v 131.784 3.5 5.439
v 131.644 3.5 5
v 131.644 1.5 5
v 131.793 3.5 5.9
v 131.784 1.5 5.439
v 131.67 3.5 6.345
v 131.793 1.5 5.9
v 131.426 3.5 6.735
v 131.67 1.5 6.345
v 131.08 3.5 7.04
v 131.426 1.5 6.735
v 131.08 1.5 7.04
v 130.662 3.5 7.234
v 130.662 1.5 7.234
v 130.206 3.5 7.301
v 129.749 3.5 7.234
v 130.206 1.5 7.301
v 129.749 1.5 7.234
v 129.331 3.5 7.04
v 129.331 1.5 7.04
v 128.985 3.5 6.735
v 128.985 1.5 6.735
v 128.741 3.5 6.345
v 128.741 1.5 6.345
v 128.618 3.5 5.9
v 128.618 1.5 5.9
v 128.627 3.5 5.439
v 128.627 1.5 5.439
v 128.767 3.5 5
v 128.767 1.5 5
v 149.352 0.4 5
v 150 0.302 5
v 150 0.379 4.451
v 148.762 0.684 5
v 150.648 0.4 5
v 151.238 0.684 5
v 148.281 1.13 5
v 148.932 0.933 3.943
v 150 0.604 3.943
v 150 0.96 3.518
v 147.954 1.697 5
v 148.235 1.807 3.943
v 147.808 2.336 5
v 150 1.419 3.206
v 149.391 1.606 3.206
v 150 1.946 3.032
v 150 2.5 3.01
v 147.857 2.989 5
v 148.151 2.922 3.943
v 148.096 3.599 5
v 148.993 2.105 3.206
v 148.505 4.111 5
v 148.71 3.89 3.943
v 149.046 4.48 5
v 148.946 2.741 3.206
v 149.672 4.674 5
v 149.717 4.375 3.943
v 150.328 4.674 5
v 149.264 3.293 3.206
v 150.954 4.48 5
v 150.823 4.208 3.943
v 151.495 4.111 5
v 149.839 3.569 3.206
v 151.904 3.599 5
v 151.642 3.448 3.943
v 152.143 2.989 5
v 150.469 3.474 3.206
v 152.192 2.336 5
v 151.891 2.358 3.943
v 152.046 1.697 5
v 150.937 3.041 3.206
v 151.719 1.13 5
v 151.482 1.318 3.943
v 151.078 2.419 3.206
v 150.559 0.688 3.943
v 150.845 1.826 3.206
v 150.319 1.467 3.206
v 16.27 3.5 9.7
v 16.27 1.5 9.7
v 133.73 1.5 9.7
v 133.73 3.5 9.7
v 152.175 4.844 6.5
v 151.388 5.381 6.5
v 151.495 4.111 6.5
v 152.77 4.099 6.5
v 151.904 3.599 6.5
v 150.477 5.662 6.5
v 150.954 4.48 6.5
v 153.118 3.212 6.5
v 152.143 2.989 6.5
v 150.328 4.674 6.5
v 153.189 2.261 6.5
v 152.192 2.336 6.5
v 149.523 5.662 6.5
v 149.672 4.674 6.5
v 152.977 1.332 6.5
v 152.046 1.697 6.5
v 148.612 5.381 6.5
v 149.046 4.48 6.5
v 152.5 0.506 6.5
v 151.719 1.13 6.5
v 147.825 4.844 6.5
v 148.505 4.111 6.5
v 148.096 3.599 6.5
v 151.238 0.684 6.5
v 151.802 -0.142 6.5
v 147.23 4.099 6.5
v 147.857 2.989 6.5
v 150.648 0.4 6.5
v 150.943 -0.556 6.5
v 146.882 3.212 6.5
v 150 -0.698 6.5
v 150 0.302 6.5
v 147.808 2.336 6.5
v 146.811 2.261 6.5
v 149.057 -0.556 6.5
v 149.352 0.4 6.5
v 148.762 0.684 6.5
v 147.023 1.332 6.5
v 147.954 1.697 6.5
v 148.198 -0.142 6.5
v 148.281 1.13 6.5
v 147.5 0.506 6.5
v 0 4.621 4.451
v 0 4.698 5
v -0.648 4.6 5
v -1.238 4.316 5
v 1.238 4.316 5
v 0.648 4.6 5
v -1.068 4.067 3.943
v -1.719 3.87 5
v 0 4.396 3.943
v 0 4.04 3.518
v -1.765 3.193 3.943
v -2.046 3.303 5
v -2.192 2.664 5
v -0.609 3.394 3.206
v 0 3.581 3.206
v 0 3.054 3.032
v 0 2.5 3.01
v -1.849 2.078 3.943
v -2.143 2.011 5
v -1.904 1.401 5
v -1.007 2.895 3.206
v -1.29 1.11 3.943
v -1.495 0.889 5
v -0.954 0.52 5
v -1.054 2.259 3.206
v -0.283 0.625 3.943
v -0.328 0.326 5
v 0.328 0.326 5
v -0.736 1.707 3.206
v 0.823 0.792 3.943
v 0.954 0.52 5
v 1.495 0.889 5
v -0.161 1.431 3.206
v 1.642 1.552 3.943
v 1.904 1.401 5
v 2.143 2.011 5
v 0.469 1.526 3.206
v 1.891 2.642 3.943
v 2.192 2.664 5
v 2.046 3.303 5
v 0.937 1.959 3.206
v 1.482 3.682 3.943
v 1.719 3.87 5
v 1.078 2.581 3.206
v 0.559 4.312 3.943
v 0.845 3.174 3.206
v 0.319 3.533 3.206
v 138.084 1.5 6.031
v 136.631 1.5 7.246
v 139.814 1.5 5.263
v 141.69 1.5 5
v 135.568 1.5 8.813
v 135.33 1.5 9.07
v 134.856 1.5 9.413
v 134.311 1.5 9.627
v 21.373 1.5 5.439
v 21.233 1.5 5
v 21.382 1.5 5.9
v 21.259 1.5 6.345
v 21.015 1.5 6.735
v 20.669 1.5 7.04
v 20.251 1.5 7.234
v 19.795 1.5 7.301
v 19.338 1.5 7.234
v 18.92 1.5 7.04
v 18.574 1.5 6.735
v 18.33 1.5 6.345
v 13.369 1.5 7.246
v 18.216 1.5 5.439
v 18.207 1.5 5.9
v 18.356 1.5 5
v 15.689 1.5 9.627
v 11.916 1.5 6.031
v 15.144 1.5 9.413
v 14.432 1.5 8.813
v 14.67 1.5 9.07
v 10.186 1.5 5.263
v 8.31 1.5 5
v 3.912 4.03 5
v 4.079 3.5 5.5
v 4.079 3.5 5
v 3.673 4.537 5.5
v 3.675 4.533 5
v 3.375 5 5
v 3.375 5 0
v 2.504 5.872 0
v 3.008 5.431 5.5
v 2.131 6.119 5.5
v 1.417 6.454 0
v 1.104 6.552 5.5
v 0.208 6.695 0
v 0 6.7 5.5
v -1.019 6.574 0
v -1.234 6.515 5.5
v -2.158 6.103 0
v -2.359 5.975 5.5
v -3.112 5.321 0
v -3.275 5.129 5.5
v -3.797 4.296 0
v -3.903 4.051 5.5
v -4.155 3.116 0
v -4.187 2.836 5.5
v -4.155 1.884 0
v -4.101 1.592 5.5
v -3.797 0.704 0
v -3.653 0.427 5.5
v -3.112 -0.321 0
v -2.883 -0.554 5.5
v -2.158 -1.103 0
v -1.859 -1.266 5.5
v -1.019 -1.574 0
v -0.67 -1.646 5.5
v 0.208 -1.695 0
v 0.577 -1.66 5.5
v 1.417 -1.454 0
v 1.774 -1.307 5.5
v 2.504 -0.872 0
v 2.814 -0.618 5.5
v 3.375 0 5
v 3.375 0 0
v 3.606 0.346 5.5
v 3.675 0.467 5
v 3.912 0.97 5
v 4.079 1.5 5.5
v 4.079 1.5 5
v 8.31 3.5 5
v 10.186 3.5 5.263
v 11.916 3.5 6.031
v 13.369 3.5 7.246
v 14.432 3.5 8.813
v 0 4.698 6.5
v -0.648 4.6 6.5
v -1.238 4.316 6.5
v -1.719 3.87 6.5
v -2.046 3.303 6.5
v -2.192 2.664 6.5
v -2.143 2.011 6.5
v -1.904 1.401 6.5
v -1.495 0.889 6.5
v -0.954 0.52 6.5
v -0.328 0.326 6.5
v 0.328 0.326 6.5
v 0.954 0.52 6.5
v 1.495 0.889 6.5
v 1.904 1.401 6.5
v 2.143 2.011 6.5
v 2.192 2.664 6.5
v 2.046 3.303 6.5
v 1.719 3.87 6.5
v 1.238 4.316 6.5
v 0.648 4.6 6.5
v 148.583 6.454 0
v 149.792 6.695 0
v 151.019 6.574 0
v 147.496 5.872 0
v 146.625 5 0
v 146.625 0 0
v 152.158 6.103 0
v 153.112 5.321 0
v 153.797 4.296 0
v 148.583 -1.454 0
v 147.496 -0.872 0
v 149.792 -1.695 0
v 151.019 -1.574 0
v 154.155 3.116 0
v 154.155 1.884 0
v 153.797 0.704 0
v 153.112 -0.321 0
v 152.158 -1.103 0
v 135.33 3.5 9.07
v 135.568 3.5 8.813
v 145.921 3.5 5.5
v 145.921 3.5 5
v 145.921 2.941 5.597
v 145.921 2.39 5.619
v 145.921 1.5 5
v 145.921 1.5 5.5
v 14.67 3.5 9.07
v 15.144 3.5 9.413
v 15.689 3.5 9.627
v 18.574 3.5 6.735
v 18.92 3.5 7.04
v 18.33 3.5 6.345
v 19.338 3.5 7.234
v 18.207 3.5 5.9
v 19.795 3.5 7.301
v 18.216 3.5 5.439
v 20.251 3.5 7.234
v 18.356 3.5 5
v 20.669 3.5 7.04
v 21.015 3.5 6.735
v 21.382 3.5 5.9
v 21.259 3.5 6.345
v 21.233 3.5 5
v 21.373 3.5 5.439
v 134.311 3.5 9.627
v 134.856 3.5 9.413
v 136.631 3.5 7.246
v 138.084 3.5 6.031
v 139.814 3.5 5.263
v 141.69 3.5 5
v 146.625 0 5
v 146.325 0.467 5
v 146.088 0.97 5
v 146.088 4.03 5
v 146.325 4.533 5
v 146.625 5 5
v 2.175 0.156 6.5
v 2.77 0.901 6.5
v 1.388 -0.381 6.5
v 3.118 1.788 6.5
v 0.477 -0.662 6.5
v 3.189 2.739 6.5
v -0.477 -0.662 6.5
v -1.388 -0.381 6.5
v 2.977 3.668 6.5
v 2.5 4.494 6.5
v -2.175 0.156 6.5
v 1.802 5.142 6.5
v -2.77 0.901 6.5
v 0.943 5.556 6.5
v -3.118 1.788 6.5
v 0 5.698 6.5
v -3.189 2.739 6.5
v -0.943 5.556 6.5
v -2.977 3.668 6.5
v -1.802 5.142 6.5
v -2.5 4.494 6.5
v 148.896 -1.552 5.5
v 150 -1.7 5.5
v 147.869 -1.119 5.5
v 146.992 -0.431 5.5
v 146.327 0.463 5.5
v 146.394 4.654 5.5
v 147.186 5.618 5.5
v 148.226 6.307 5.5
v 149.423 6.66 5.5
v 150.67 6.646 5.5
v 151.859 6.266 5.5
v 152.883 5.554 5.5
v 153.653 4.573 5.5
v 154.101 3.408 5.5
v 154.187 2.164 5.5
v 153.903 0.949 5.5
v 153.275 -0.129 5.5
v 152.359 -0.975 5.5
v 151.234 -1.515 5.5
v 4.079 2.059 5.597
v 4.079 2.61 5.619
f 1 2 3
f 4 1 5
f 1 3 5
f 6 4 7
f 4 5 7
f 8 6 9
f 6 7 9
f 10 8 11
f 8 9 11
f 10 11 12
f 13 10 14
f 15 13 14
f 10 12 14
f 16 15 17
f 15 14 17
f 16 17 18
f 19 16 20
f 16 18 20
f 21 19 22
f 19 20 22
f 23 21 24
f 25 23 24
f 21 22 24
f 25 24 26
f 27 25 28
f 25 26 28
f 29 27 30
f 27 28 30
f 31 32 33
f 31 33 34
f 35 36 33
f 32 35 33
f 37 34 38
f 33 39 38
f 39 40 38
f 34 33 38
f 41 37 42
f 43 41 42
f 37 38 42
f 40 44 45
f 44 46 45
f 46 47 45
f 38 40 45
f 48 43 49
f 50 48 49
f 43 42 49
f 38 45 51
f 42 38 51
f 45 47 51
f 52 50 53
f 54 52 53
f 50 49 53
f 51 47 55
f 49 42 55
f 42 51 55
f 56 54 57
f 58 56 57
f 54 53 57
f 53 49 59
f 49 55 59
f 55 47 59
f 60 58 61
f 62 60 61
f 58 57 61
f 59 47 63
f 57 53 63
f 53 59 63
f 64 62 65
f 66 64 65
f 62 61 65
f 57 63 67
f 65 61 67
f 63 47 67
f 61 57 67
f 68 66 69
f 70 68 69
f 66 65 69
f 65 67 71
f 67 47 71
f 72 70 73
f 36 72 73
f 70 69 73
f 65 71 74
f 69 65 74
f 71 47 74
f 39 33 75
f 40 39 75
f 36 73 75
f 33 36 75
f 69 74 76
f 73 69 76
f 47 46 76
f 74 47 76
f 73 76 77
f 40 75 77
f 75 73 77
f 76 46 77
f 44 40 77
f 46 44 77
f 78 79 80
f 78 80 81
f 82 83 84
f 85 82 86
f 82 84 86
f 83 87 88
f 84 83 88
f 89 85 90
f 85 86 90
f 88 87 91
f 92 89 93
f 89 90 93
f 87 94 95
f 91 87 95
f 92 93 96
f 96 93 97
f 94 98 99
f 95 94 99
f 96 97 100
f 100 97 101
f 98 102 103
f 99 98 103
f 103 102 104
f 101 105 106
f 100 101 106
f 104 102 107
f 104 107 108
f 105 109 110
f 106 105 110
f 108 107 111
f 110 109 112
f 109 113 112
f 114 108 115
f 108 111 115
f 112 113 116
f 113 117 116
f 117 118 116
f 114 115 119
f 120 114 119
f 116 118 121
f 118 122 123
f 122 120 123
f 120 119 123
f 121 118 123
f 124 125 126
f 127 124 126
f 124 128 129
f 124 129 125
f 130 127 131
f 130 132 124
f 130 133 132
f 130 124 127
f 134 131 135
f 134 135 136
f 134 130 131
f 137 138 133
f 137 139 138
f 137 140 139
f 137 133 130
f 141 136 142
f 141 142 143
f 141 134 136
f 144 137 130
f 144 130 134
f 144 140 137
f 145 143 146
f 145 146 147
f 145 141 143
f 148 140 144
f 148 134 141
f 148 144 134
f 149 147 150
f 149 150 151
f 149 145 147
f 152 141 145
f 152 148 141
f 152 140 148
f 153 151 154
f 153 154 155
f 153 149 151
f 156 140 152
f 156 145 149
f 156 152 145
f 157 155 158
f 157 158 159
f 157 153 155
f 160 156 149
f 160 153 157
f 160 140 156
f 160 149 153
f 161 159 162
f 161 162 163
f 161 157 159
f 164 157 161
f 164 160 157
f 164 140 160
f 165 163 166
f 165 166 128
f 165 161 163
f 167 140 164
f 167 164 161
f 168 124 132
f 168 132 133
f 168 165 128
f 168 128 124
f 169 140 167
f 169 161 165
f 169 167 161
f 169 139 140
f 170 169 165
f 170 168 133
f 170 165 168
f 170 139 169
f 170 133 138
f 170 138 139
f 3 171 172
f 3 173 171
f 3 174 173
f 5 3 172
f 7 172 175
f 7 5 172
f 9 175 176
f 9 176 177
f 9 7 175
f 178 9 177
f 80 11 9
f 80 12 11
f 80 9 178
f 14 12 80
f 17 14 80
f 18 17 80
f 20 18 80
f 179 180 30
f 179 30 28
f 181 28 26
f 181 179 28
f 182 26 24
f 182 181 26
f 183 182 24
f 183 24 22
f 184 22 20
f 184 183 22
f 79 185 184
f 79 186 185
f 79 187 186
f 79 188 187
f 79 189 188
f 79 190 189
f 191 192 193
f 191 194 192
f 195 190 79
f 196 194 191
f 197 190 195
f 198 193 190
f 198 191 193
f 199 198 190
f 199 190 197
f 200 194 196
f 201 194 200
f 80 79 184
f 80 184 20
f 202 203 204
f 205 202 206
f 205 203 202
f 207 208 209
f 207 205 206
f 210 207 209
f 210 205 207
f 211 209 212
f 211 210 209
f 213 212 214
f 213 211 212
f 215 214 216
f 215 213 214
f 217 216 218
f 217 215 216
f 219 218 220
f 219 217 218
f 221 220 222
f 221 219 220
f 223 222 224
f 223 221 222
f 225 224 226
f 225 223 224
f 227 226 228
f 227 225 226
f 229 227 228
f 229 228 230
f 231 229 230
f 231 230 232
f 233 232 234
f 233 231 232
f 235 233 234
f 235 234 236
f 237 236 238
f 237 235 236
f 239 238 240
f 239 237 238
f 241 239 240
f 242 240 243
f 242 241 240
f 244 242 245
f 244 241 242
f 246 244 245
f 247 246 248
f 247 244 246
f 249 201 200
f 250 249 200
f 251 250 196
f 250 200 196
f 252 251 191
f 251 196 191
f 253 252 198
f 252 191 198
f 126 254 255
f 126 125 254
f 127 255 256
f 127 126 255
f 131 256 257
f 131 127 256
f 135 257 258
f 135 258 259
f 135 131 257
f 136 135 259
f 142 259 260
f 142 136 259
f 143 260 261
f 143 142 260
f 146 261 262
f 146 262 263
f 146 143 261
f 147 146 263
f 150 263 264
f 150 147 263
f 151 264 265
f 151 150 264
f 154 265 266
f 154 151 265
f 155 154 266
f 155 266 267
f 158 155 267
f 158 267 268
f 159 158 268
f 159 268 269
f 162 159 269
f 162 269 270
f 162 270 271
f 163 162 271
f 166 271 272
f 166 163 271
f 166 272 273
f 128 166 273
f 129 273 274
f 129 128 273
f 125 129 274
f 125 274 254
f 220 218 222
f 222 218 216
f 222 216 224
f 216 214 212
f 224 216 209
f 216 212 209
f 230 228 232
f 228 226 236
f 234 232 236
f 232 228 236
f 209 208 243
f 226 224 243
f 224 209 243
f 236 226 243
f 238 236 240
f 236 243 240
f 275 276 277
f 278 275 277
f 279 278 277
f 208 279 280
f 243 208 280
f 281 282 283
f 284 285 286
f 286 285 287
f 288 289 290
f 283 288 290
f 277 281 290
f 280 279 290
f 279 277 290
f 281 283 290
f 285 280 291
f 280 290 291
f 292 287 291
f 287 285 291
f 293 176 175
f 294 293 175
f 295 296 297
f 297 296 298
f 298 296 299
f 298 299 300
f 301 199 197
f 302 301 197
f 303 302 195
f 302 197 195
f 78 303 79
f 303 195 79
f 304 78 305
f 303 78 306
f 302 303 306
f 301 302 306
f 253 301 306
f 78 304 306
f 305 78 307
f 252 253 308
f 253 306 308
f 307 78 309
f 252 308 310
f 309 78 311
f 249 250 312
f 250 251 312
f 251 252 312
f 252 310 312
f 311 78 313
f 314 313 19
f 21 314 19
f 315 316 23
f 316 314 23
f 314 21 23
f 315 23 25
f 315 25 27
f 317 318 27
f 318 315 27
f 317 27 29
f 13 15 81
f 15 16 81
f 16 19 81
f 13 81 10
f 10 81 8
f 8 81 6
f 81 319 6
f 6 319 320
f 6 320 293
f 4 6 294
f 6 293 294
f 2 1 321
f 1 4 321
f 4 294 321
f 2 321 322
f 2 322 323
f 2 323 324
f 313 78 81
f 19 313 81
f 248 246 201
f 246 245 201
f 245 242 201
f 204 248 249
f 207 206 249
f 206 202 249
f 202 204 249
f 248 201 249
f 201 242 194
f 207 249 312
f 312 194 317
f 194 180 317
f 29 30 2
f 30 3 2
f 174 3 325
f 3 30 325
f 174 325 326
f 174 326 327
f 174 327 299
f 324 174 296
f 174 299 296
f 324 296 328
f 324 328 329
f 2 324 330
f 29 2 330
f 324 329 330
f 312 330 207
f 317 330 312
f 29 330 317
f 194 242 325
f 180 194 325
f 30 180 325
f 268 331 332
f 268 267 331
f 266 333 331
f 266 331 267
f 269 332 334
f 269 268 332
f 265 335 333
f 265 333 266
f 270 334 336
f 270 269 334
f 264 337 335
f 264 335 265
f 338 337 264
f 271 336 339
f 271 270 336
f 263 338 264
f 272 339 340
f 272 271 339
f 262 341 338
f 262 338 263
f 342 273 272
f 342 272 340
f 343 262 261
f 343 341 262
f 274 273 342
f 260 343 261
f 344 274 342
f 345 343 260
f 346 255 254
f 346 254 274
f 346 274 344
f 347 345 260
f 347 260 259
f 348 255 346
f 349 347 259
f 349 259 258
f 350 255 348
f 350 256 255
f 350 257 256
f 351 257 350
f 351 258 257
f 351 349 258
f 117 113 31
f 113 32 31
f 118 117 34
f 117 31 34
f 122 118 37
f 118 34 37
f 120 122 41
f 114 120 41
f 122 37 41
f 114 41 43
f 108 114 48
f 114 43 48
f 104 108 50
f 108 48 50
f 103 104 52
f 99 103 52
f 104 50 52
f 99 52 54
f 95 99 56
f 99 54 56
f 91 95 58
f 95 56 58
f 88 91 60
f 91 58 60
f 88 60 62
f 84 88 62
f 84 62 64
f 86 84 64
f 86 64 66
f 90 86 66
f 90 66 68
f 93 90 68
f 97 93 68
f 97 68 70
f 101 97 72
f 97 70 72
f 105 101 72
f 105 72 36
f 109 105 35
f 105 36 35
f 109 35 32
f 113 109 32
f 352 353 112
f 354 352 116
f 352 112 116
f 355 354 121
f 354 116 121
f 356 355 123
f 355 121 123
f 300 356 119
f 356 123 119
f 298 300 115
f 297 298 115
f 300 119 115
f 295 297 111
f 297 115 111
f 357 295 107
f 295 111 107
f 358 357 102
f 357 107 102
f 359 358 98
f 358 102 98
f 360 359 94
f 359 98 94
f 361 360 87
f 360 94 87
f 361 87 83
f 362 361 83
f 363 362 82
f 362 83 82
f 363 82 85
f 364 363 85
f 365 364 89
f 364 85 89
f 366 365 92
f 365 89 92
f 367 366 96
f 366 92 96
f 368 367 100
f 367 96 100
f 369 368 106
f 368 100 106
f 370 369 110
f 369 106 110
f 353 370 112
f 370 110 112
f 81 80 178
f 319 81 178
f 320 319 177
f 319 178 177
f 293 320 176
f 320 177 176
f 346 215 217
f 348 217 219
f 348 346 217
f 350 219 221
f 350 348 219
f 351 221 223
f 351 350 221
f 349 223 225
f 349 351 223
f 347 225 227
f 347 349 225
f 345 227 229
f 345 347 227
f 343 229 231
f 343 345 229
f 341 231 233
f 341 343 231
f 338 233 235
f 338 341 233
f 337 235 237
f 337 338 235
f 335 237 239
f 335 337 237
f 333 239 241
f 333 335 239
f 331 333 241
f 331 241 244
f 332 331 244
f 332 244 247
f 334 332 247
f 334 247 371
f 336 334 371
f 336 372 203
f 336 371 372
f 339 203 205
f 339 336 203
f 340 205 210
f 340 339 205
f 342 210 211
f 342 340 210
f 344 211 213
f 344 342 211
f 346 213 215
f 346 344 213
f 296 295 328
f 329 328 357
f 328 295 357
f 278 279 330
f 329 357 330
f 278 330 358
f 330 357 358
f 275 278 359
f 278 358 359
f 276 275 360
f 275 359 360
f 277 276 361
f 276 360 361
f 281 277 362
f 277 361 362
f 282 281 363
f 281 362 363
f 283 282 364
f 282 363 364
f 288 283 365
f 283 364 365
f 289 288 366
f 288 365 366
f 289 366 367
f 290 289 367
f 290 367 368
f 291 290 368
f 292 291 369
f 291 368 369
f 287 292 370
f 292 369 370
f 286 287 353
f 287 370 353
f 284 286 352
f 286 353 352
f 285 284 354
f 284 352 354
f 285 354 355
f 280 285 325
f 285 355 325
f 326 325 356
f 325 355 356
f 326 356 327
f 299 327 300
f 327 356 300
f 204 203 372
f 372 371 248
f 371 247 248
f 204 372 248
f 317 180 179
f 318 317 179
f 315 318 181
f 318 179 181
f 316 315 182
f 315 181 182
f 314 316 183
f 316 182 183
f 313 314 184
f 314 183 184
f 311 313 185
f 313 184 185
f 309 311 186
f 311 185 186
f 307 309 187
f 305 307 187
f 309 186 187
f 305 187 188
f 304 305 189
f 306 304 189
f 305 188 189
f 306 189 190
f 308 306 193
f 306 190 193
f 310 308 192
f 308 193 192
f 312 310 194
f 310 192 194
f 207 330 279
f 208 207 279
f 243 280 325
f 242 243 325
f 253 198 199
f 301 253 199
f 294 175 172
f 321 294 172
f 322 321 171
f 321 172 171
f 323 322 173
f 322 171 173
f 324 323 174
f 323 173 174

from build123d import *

# Parameters (mm, degrees)
EXTRUDE_1_REACH                  = 81.748
EXTRUDE_1_END_RADIUS             = 4.2
EXTRUDE_1_DIRECTION_2_REACH      = 81.748
EXTRUDE_1_DIRECTION_2_END_RADIUS = 4.2
CUT_EXTRUDE_2_DEPTH              = 155.592270182
CUT_EXTRUDE_3_DEPTH              = 155.592270182


with BuildPart() as part:
    # 스케치1 → 회전2 (revolve)
    with BuildSketch(Plane(origin=(0, 0, 0), x_dir=(0, 0, -1), z_dir=(1, 0, 0))):
        with BuildLine():
            Line((-6.500191237, 4.698061575), (-5.000191237, 4.698061575))
            ThreePointArc((-5.000191237, 4.698061575), (-3.517605127, 4.040424575), (-3.010022497, 2.5))
            Line((-3.010022497, 2.5), (0, 2.5))
            Line((0, 2.5), (0, 6.7))
            Line((0, 6.7), (-5.5, 6.7))
            Line((-5.5, 6.7), (-6.500191237, 5.698061575))
            Line((-6.500191237, 5.698061575), (-6.500191237, 4.698061575))
        make_face()
    revolve(axis=Axis((0, 2.5, -8.961352657), (0, 0, 1)))



with BuildPart() as body_2:
    # 스케치2 → 회전3 (revolve)
    with BuildSketch(Plane(origin=(150, 0, 0), x_dir=(0, 0, -1), z_dir=(1, 0, 0)), mode=Mode.PRIVATE) as revolve_3_sk:
        with BuildLine():
            Line((0, 2.5), (0, 6.7))
            Line((0, 6.7), (-5.5, 6.7))
            Line((-5.5, 6.7), (-6.500191237, 5.698061575))
            Line((-6.500191237, 5.698061575), (-6.500191237, 4.698061575))
            Line((-6.500191237, 4.698061575), (-5.000191237, 4.698061575))
            ThreePointArc((-5.000191237, 4.698061575), (-3.517605127, 4.040424575), (-3.010022497, 2.5))
            Line((-3.010022497, 2.5), (0, 2.5))
        make_face()
    revolve(revolve_3_sk.sketch.rotate(Axis((150, 2.5, 3.010022497), (0, 0, -1)), 180), axis=Axis((150, 2.5, 3.010022497), (0, 0, -1)))


with BuildPart() as part_1:
    add(part.part)

    add(body_2.part)  # 보스-돌출1 merges body 2
    # 보스-돌출1: up to this cylinder (the profile starts outside it)
    extrude_1_end = Plane(origin=(150, 2.5, 3.825291), z_dir=(0, 0, 1)) * Cylinder(EXTRUDE_1_END_RADIUS, 172.896, mode=Mode.PRIVATE)
    # 스케치3 → 보스-돌출1 (add, up to the surface)
    with BuildSketch(Plane(origin=(75, 0, 0), x_dir=(0, 0, -1), z_dir=(1, 0, 0)), mode=Mode.PRIVATE) as extrude_1_sk1:
        Polygon((-5, 3.5), (-5, 5), (0, 5), (0, 0), (-5, 0), (-5, 1.5), (-9.7, 1.5), (-9.7, 3.5), align=None)
    extrude_1_tool1 = extrude(extrude_1_sk1.sketch, amount=EXTRUDE_1_REACH, mode=Mode.PRIVATE) - extrude_1_end
    add(extrude_1_tool1.solids().sort_by_distance((75, 2.5, 3.825291))[0])

    # 보스-돌출1 direction 2: up to this cylinder (the profile starts outside it)
    extrude_1_direction_2_end = Plane(origin=(0, 2.5, 3.825291), z_dir=(0, 0, -1)) * Cylinder(EXTRUDE_1_DIRECTION_2_END_RADIUS, 172.896, mode=Mode.PRIVATE)
    # 스케치3 → 보스-돌출1 direction 2 (add, up to the surface)
    with BuildSketch(Plane(origin=(75, 0, 0), x_dir=(0, 0, -1), z_dir=(1, 0, 0)), mode=Mode.PRIVATE) as extrude_1_direction_2_sk1:
        Polygon((-5, 3.5), (-5, 5), (0, 5), (0, 0), (-5, 0), (-5, 1.5), (-9.7, 1.5), (-9.7, 3.5), align=None)
    extrude_1_direction_2_tool1 = extrude(extrude_1_direction_2_sk1.sketch, amount=-EXTRUDE_1_DIRECTION_2_REACH, mode=Mode.PRIVATE) - extrude_1_direction_2_end
    add(extrude_1_direction_2_tool1.solids().sort_by_distance((75, 2.5, 3.825291))[0])

    # 스케치4 → 컷-돌출2 (cut, through all)
    with BuildSketch(Plane.XZ.offset(-1.5)):
        with BuildLine():
            Line((145.920784389, 9.7), (133.73, 9.7))
            ThreePointArc((133.73, 9.7), (134.59, 9.536801651), (135.330428215, 9.069897208))
            Line((135.330428215, 9.069897208), (135.567873872, 8.812759968))
            ThreePointArc((135.567873872, 8.812759968), (138.083605002, 6.031129475), (141.689592152, 5))
            Line((141.689592152, 5), (145.920784389, 5))
            Line((145.920784389, 5), (145.920784389, 9.7))
        make_face()
        with BuildLine():
            ThreePointArc((14.669571785, 9.069897208), (15.41, 9.536801651), (16.27, 9.7))
            Line((16.27, 9.7), (4.079215611, 9.7))
            Line((4.079215611, 9.7), (4.079215611, 5))
            Line((4.079215611, 5), (8.310407839, 5))
            ThreePointArc((8.310407839, 5), (11.916394994, 6.031129473), (14.432126128, 8.812759968))
            Line((14.432126128, 8.812759968), (14.669571785, 9.069897208))
        make_face()
    extrude(amount=-CUT_EXTRUDE_2_DEPTH, mode=Mode.SUBTRACT)

    # 스케치6 → 컷-돌출3 (cut, through all)
    with BuildSketch(Plane.XZ.offset(-1.5)):
        with BuildLine():
            ThreePointArc((21.233, 5), (19.7945, 7.300512491), (18.356, 5))
            Line((18.356, 5), (21.233, 5))
        make_face()
        with BuildLine():
            ThreePointArc((131.644, 5), (130.2055, 7.300512491), (128.767, 5))
            Line((128.767, 5), (131.644, 5))
        make_face()
    extrude(amount=-CUT_EXTRUDE_3_DEPTH, mode=Mode.SUBTRACT)


solid = part_1.part
